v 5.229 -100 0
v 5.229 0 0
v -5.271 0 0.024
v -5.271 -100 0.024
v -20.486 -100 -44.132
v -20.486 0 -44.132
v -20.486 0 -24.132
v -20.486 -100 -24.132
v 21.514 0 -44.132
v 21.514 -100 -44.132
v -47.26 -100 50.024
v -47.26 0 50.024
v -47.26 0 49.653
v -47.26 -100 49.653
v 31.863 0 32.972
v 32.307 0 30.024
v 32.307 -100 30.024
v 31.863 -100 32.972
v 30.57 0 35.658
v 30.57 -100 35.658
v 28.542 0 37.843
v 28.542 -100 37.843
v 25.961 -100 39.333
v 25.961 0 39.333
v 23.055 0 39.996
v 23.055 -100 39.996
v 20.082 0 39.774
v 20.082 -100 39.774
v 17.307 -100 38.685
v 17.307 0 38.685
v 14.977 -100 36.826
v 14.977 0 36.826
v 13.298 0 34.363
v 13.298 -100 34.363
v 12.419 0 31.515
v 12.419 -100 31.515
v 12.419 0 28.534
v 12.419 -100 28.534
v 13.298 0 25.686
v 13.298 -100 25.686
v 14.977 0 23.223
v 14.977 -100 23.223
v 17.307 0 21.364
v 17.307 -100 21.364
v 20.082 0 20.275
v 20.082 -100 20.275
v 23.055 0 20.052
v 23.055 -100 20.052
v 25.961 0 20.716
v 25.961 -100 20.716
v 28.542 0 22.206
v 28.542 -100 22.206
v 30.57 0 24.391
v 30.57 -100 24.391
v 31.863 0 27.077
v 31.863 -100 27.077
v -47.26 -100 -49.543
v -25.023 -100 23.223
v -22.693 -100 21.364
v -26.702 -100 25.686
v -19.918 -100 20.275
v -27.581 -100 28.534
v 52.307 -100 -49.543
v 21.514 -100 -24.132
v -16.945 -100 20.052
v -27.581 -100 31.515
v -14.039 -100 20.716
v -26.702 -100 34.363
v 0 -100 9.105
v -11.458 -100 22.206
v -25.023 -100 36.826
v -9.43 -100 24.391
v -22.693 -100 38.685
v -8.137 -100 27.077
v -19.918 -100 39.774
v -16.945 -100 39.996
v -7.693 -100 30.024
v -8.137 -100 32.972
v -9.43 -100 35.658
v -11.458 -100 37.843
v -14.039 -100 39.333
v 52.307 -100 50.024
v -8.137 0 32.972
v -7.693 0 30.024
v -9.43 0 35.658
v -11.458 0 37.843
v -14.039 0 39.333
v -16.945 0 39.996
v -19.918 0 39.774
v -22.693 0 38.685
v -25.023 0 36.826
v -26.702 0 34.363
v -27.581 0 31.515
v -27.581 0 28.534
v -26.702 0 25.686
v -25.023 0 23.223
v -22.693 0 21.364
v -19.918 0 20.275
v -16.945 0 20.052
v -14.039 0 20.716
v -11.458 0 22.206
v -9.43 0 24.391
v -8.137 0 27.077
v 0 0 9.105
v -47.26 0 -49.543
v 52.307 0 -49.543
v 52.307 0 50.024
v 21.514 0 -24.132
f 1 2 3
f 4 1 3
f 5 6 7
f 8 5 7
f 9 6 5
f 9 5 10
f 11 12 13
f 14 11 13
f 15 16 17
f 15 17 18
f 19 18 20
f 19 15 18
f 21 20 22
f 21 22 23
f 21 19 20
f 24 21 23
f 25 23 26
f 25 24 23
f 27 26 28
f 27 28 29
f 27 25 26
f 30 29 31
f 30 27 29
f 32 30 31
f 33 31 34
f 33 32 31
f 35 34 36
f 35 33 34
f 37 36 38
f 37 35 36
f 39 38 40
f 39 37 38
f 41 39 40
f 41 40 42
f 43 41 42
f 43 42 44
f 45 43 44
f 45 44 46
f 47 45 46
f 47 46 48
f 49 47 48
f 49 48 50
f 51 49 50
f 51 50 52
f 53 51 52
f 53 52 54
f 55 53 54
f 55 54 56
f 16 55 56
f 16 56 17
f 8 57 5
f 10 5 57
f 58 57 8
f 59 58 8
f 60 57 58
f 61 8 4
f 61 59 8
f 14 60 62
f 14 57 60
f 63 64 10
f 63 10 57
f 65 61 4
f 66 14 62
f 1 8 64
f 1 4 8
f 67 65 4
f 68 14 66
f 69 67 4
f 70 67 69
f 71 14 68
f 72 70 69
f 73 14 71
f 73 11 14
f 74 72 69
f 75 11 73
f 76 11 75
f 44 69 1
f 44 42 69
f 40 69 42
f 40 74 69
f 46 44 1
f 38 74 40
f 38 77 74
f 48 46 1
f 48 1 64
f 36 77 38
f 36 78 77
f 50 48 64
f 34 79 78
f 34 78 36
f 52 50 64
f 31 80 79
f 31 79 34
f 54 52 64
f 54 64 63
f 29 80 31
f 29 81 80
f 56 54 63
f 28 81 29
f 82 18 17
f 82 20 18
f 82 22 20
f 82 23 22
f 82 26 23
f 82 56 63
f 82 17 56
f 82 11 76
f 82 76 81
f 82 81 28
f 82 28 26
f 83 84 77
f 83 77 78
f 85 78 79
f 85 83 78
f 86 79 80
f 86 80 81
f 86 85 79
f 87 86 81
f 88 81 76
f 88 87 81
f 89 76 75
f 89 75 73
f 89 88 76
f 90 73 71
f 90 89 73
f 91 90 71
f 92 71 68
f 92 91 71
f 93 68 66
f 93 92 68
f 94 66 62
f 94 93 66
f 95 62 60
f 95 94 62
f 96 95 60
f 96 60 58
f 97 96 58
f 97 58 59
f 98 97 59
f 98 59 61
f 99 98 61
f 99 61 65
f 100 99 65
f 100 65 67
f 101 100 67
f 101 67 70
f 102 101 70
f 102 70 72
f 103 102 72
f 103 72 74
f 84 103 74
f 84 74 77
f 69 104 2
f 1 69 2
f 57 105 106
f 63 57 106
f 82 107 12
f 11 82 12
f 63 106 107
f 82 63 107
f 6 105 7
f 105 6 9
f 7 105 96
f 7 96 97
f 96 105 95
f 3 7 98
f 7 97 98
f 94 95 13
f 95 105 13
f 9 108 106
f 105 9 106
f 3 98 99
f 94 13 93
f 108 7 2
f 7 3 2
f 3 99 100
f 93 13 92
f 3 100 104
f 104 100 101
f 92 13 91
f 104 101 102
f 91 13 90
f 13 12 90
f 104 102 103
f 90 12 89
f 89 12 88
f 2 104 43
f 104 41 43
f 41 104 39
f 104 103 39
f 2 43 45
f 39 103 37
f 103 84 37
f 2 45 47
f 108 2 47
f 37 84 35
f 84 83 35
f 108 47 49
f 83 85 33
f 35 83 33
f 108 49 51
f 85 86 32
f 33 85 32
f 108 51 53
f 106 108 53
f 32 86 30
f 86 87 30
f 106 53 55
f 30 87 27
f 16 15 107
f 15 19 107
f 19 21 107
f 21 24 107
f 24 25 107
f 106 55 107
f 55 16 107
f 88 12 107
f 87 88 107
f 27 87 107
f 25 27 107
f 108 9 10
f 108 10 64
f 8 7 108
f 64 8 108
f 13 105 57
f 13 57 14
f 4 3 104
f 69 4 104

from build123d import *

# Parameters (mm, degrees)
F0_W     = 98.895595
F0_H     = 99.196188
F0_W_2   = 42
F0_H_2   = 20
F0_R     = 10
F1_DEPTH = 100
F3_DEPTH = 25


with BuildPart() as f1:
    # F0 (on Front) → F1 (new body)
    with BuildSketch(Plane.XZ):
        Polygon((52.307254, -49.542874), (52.307254, 50.024388), (-47.259618, 50.024388), (-47.259618, 49.653314), (51.635977, 49.653314), (51.635977, -49.542874), align=None)
        with Locations((2.18818, 0.05522)):
            Rectangle(F0_W, F0_H)
        with Locations((0.514312, -34.132177)):
            Rectangle(F0_W_2, F0_H_2, mode=Mode.SUBTRACT)
        Polygon((5.228865, 0), (-5.271107, 0.024388), (0, 9.105436), align=None, mode=Mode.SUBTRACT)
        with Locations((-17.692746, 30.024388)):
            Circle(F0_R, mode=Mode.SUBTRACT)
        with Locations((22.307254, 30.024388)):
            Circle(F0_R, mode=Mode.SUBTRACT)
    extrude(amount=F1_DEPTH)

    # F0 (on Front) → F3 (join)
    with BuildSketch(Plane.XZ):
        Polygon((52.307254, -49.542874), (52.307254, 50.024388), (-47.259618, 50.024388), (-47.259618, 49.653314), (51.635977, 49.653314), (51.635977, -49.542874), align=None)
        with Locations((2.18818, 0.05522)):
            Rectangle(F0_W, F0_H)
        with Locations((0.514312, -34.132177)):
            Rectangle(F0_W_2, F0_H_2, mode=Mode.SUBTRACT)
        Polygon((5.228865, 0), (-5.271107, 0.024388), (0, 9.105436), align=None, mode=Mode.SUBTRACT)
        with Locations((-17.692746, 30.024388)):
            Circle(F0_R, mode=Mode.SUBTRACT)
        with Locations((22.307254, 30.024388)):
            Circle(F0_R, mode=Mode.SUBTRACT)
    extrude(amount=F3_DEPTH)


solid = f1.part
